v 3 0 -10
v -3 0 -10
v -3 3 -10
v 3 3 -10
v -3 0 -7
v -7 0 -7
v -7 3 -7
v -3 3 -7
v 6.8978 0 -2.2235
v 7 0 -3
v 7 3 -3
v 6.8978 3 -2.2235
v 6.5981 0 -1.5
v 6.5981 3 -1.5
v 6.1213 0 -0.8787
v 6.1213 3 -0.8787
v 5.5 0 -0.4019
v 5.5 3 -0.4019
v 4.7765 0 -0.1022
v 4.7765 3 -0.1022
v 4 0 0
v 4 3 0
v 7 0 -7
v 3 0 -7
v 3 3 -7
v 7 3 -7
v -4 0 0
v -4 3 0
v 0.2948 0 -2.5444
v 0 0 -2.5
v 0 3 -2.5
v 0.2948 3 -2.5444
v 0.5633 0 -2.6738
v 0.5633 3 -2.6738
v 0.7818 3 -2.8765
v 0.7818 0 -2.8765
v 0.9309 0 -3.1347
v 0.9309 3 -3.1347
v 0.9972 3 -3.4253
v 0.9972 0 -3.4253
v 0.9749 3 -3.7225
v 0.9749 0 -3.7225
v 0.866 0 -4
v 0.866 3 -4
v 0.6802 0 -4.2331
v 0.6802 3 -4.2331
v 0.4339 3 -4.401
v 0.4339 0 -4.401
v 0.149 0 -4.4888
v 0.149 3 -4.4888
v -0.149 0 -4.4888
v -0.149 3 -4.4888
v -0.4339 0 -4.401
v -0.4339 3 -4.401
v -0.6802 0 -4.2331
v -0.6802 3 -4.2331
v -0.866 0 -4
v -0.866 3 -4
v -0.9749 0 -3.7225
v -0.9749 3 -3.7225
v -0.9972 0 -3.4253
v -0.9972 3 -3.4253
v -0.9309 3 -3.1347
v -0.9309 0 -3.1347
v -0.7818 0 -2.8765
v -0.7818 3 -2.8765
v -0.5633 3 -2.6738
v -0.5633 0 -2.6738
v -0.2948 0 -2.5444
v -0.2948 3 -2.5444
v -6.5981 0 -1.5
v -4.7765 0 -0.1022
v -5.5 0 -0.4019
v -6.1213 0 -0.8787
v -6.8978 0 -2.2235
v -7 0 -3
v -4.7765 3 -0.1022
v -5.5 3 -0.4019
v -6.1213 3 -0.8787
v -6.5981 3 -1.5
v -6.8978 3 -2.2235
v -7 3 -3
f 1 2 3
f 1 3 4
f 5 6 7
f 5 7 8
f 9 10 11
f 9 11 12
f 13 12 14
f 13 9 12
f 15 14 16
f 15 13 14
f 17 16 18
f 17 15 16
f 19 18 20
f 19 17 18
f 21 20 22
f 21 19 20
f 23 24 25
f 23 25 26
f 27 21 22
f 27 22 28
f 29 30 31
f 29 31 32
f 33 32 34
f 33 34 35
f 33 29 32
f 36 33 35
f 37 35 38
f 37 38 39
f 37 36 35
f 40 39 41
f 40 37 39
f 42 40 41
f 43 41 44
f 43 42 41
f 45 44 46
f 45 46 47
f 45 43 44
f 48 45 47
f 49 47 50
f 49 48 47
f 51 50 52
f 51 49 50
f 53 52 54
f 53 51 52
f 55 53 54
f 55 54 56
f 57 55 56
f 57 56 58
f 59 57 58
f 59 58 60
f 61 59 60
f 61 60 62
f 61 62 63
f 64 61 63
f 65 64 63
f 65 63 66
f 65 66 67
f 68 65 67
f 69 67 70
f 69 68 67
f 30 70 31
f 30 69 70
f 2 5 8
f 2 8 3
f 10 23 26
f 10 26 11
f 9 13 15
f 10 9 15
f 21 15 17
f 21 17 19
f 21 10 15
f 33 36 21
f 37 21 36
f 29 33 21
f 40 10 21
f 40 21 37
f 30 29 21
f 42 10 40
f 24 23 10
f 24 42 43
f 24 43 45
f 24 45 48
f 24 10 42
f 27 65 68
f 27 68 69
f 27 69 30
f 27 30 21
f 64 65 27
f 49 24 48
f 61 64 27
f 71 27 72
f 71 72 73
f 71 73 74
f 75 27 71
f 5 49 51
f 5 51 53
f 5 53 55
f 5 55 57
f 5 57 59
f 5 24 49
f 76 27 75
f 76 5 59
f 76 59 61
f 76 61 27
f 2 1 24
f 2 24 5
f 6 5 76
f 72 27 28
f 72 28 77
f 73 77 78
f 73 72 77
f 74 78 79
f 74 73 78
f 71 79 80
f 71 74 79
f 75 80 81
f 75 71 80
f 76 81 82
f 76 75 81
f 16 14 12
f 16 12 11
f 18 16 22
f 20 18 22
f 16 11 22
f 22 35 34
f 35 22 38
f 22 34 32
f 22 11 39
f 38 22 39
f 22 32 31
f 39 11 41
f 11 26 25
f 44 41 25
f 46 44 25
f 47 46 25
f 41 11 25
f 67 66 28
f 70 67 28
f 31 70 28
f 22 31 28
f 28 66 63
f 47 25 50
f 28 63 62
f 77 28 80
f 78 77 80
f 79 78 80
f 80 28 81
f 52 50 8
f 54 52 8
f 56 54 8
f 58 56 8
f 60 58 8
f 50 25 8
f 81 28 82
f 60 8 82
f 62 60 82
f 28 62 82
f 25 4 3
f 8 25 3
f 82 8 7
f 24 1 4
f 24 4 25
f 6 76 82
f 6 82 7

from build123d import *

# Parameters (mm, degrees)
ESQUISSE1_R        = 1
BOSS_EXTRU_1_DEPTH = 3


with BuildPart() as part:
    # Esquisse1 → Boss.-Extru.1 (new body)
    with BuildSketch(Plane(origin=(0, 0, 0), x_dir=(1, 0, 0), z_dir=(0, 1, 0))):
        with BuildLine():
            Line((-7, 7), (-3, 7))
            Line((-3, 7), (-3, 10))
            Line((-3, 10), (3, 10))
            Line((3, 10), (3, 7))
            Line((3, 7), (7, 7))
            Line((7, 7), (7, 3))
            ThreePointArc((7, 3), (6.121320344, 0.878679656), (4, 0))
            Line((4, 0), (-4, 0))
            ThreePointArc((-4, 0), (-6.121320344, 0.878679656), (-7, 3))
            Line((-7, 3), (-7, 7))
        make_face()
        with Locations(Location((0, 3.5, 0), (0, 0, 270))):
            Circle(ESQUISSE1_R, mode=Mode.SUBTRACT)
    extrude(amount=BOSS_EXTRU_1_DEPTH)


solid = part.part
